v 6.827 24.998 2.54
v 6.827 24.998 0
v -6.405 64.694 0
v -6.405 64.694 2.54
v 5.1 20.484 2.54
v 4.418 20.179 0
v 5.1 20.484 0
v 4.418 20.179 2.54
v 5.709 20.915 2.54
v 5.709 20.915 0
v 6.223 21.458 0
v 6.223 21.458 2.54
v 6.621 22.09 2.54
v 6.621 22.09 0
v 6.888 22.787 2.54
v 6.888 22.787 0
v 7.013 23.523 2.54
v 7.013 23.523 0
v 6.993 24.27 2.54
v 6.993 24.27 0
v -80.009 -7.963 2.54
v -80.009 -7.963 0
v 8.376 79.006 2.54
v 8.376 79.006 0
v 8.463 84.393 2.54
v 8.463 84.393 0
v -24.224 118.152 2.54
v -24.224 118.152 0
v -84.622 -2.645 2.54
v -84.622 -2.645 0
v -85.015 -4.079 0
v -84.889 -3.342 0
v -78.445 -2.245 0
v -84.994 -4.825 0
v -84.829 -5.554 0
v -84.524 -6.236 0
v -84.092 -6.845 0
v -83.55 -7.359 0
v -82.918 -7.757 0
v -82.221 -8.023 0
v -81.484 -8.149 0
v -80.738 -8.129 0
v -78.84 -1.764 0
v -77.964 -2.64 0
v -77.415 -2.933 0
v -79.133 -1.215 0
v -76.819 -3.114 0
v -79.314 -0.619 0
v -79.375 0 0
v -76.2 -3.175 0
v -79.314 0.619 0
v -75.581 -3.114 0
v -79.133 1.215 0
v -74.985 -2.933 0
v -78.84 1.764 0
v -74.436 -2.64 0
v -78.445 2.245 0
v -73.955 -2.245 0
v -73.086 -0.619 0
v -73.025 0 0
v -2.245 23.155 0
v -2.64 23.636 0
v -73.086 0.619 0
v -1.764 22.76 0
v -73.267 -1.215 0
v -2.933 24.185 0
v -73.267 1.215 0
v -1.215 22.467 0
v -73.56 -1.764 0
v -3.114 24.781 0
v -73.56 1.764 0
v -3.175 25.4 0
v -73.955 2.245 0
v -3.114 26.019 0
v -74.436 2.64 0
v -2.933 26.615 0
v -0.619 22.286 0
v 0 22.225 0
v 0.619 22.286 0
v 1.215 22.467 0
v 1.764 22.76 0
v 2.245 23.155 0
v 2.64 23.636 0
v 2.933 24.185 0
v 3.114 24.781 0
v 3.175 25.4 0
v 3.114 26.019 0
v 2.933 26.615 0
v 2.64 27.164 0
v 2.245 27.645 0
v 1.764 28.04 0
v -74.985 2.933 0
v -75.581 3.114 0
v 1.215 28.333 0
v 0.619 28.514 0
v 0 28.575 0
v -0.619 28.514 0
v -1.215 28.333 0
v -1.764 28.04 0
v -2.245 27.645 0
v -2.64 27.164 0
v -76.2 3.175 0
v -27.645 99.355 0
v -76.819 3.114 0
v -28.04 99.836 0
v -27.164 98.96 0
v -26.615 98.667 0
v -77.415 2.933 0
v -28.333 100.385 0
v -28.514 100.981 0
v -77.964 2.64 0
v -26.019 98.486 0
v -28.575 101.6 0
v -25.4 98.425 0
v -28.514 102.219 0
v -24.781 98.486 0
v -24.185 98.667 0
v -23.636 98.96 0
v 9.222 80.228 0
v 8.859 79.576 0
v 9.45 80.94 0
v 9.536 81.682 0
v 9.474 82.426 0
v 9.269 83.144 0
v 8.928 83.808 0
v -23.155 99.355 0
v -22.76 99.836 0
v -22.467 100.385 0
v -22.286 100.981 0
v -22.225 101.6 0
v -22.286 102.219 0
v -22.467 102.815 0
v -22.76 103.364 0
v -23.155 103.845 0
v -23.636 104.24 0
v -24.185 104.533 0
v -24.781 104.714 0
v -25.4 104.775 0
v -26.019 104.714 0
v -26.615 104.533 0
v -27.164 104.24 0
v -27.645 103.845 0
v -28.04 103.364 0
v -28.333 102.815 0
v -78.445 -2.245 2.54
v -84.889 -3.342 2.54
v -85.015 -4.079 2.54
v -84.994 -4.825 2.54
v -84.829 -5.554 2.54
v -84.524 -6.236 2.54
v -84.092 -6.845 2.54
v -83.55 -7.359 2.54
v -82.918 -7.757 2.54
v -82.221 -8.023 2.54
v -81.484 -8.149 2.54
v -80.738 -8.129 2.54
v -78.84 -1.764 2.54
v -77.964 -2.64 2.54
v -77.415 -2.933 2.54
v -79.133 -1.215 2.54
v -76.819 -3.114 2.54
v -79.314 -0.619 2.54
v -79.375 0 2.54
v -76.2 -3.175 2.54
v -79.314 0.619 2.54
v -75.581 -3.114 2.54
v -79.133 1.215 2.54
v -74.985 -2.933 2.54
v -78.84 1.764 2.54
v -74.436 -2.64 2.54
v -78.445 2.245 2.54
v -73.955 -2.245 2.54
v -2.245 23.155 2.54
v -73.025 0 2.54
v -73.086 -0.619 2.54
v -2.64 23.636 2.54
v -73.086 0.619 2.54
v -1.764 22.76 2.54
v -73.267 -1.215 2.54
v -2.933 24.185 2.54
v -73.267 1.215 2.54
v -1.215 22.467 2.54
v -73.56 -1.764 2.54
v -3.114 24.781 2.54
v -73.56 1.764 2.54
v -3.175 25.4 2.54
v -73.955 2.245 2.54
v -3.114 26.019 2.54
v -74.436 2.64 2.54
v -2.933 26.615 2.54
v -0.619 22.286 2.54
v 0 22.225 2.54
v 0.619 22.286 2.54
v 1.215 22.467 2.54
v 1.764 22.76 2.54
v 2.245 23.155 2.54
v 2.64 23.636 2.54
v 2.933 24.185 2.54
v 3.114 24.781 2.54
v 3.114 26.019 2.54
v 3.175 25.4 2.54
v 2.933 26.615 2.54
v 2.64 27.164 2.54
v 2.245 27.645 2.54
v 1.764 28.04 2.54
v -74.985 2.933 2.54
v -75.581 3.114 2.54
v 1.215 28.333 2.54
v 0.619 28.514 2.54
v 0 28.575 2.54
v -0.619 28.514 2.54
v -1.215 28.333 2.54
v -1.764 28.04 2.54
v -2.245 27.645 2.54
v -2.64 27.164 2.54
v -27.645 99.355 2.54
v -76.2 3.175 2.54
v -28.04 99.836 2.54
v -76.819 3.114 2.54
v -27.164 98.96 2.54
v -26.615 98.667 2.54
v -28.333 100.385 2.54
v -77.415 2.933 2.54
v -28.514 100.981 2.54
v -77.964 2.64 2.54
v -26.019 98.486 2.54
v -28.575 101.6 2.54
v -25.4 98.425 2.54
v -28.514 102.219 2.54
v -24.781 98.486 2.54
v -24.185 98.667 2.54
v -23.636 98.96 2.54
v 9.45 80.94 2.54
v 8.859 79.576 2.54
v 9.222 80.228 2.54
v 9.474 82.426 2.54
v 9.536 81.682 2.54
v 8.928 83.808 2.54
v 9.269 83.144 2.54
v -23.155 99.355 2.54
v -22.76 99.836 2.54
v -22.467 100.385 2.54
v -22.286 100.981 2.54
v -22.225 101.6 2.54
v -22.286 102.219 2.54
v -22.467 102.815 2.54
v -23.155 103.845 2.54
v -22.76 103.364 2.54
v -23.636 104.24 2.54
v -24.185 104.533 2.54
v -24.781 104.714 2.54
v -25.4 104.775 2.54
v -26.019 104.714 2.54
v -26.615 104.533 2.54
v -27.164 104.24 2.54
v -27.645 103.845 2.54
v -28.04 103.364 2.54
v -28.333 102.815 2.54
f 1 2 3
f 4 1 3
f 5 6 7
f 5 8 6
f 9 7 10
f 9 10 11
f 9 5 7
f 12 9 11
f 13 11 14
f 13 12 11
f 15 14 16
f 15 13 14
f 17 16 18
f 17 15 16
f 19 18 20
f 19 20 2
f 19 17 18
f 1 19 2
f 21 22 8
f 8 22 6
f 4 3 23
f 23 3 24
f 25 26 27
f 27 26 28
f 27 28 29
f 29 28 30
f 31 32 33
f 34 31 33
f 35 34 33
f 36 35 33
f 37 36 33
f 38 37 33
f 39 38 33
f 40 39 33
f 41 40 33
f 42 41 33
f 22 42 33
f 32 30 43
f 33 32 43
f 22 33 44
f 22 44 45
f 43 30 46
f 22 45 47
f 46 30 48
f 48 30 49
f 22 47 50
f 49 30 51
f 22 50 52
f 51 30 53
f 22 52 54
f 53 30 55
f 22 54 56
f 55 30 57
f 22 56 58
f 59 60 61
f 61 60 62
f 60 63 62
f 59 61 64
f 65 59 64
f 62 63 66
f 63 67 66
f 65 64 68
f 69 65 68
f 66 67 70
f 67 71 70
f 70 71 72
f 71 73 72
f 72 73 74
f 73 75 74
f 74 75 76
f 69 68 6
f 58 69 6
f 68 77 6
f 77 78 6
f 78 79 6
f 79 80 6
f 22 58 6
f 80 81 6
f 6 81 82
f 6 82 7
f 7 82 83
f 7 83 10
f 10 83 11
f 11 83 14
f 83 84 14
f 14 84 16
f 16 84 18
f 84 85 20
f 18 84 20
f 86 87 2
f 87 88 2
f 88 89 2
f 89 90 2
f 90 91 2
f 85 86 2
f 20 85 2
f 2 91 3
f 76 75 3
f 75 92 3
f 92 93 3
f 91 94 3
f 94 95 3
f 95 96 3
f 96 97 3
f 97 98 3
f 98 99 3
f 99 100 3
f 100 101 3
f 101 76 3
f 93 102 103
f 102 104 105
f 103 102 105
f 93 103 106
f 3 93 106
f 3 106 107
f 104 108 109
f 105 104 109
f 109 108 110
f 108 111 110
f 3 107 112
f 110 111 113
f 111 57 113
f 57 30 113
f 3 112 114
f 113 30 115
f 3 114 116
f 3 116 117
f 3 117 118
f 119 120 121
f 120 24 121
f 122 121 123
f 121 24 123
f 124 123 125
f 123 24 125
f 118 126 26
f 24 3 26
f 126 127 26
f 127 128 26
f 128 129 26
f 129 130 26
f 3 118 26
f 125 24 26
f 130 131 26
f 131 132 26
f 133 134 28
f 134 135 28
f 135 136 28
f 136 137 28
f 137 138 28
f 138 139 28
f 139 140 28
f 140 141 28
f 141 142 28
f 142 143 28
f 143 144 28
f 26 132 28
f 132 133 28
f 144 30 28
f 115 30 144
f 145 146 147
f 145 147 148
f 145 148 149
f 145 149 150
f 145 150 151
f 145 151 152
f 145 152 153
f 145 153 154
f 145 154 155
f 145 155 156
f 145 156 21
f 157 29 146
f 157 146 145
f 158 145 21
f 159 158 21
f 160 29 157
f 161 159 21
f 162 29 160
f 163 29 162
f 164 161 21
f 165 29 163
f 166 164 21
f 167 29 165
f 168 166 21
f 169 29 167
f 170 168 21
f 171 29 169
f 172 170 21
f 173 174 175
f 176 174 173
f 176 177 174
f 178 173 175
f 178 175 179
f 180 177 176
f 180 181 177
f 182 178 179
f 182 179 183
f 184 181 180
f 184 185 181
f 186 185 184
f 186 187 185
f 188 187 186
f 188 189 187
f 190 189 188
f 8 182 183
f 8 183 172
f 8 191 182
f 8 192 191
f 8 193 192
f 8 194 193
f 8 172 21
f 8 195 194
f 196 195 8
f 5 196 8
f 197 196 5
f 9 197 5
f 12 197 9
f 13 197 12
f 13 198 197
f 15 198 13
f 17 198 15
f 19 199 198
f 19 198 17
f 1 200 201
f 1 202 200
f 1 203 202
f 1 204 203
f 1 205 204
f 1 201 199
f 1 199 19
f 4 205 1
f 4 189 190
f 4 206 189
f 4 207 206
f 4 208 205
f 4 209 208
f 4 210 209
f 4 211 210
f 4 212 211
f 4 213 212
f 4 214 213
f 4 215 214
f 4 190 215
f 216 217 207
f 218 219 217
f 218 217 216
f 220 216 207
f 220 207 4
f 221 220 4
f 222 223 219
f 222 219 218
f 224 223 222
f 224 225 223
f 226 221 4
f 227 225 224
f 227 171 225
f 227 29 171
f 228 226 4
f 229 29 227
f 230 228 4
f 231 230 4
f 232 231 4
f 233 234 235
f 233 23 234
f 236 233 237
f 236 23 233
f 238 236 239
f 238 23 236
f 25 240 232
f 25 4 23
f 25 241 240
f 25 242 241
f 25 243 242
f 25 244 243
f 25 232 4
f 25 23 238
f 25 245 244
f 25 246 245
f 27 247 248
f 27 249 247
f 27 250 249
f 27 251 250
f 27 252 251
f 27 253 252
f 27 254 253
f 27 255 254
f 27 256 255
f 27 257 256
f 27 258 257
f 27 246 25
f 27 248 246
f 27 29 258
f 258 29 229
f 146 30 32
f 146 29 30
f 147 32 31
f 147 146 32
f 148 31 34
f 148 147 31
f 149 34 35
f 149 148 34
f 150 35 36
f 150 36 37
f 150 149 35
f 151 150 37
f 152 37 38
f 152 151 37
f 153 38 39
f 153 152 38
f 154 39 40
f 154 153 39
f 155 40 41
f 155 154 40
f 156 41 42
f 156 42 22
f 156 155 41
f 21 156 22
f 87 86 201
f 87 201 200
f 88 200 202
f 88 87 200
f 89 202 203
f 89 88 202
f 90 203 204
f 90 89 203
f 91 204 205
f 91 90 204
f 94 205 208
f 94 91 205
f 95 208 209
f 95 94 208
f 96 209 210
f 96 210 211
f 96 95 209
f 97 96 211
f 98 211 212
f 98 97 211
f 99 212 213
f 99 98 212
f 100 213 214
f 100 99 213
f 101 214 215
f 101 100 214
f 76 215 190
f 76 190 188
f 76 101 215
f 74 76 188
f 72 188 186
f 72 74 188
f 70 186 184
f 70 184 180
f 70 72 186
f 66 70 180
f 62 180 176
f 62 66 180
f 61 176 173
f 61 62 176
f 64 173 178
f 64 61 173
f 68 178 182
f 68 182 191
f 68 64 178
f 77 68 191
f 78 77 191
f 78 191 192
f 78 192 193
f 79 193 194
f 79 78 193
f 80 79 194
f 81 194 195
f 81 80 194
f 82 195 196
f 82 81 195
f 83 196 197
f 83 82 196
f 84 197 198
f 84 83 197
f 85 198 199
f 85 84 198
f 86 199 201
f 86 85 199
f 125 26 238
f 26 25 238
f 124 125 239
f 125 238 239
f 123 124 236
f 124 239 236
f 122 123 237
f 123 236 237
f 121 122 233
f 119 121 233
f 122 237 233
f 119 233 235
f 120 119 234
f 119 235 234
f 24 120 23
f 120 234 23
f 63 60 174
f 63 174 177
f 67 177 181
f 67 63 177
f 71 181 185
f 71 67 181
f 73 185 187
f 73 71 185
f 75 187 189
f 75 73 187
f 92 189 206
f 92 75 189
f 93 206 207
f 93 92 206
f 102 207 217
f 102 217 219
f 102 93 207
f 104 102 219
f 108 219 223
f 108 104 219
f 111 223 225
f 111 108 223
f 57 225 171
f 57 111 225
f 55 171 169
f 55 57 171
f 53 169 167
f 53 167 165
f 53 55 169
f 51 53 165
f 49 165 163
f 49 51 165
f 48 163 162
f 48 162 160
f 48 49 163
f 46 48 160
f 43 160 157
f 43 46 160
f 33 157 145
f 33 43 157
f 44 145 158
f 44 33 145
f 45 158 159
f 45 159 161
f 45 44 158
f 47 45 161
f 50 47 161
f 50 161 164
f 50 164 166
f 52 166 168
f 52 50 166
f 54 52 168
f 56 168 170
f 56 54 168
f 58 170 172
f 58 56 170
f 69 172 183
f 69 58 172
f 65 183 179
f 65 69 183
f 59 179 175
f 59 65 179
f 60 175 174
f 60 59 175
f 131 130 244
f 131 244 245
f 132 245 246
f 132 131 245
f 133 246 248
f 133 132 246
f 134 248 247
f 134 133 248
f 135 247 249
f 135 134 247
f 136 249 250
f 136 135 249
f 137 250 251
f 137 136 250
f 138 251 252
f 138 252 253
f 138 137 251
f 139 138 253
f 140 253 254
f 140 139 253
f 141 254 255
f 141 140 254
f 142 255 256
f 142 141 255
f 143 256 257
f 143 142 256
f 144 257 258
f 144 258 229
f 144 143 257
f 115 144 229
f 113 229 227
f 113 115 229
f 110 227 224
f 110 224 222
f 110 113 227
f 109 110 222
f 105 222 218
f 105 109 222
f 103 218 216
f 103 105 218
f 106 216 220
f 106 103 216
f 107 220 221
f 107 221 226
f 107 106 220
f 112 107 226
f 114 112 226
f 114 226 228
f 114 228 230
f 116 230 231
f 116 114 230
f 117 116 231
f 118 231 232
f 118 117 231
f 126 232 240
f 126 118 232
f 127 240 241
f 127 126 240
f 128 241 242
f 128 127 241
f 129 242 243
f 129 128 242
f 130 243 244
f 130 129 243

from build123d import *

# Parameters (mm, degrees)
SKETCH1_R           = 3.175
BOSS_EXTRUDE1_DEPTH = 2.54
FILLET1_R           = 3.81


with BuildPart() as part:
    # Sketch1 → Boss-Extrude1 (new body)
    with BuildSketch(Plane.XY):
        Polygon((-24.223713703, 118.151604251), (-88.735511623, -10.871991588), (8.032185257, 21.383907372), (-6.404519195, 64.694020727), (11.113552526, 81.656157748), align=None)
        with Locations((-76.2, 0)):
            Circle(SKETCH1_R, mode=Mode.SUBTRACT)
        with Locations((0, 25.4)):
            Circle(SKETCH1_R, mode=Mode.SUBTRACT)
        with Locations((-25.4, 101.6)):
            Circle(SKETCH1_R, mode=Mode.SUBTRACT)
    extrude(amount=BOSS_EXTRUDE1_DEPTH)

    # Fillet1
    fillet1_edges = [part.edges().sort_by_distance(p)[0] for p in [
        (11.113552526, 81.656157748, 1.27),
        (8.032185257, 21.383907372, 1.27),
        (-88.735511623, -10.871991588, 1.27),
    ]]
    fillet(fillet1_edges, radius=FILLET1_R)


solid = part.part
